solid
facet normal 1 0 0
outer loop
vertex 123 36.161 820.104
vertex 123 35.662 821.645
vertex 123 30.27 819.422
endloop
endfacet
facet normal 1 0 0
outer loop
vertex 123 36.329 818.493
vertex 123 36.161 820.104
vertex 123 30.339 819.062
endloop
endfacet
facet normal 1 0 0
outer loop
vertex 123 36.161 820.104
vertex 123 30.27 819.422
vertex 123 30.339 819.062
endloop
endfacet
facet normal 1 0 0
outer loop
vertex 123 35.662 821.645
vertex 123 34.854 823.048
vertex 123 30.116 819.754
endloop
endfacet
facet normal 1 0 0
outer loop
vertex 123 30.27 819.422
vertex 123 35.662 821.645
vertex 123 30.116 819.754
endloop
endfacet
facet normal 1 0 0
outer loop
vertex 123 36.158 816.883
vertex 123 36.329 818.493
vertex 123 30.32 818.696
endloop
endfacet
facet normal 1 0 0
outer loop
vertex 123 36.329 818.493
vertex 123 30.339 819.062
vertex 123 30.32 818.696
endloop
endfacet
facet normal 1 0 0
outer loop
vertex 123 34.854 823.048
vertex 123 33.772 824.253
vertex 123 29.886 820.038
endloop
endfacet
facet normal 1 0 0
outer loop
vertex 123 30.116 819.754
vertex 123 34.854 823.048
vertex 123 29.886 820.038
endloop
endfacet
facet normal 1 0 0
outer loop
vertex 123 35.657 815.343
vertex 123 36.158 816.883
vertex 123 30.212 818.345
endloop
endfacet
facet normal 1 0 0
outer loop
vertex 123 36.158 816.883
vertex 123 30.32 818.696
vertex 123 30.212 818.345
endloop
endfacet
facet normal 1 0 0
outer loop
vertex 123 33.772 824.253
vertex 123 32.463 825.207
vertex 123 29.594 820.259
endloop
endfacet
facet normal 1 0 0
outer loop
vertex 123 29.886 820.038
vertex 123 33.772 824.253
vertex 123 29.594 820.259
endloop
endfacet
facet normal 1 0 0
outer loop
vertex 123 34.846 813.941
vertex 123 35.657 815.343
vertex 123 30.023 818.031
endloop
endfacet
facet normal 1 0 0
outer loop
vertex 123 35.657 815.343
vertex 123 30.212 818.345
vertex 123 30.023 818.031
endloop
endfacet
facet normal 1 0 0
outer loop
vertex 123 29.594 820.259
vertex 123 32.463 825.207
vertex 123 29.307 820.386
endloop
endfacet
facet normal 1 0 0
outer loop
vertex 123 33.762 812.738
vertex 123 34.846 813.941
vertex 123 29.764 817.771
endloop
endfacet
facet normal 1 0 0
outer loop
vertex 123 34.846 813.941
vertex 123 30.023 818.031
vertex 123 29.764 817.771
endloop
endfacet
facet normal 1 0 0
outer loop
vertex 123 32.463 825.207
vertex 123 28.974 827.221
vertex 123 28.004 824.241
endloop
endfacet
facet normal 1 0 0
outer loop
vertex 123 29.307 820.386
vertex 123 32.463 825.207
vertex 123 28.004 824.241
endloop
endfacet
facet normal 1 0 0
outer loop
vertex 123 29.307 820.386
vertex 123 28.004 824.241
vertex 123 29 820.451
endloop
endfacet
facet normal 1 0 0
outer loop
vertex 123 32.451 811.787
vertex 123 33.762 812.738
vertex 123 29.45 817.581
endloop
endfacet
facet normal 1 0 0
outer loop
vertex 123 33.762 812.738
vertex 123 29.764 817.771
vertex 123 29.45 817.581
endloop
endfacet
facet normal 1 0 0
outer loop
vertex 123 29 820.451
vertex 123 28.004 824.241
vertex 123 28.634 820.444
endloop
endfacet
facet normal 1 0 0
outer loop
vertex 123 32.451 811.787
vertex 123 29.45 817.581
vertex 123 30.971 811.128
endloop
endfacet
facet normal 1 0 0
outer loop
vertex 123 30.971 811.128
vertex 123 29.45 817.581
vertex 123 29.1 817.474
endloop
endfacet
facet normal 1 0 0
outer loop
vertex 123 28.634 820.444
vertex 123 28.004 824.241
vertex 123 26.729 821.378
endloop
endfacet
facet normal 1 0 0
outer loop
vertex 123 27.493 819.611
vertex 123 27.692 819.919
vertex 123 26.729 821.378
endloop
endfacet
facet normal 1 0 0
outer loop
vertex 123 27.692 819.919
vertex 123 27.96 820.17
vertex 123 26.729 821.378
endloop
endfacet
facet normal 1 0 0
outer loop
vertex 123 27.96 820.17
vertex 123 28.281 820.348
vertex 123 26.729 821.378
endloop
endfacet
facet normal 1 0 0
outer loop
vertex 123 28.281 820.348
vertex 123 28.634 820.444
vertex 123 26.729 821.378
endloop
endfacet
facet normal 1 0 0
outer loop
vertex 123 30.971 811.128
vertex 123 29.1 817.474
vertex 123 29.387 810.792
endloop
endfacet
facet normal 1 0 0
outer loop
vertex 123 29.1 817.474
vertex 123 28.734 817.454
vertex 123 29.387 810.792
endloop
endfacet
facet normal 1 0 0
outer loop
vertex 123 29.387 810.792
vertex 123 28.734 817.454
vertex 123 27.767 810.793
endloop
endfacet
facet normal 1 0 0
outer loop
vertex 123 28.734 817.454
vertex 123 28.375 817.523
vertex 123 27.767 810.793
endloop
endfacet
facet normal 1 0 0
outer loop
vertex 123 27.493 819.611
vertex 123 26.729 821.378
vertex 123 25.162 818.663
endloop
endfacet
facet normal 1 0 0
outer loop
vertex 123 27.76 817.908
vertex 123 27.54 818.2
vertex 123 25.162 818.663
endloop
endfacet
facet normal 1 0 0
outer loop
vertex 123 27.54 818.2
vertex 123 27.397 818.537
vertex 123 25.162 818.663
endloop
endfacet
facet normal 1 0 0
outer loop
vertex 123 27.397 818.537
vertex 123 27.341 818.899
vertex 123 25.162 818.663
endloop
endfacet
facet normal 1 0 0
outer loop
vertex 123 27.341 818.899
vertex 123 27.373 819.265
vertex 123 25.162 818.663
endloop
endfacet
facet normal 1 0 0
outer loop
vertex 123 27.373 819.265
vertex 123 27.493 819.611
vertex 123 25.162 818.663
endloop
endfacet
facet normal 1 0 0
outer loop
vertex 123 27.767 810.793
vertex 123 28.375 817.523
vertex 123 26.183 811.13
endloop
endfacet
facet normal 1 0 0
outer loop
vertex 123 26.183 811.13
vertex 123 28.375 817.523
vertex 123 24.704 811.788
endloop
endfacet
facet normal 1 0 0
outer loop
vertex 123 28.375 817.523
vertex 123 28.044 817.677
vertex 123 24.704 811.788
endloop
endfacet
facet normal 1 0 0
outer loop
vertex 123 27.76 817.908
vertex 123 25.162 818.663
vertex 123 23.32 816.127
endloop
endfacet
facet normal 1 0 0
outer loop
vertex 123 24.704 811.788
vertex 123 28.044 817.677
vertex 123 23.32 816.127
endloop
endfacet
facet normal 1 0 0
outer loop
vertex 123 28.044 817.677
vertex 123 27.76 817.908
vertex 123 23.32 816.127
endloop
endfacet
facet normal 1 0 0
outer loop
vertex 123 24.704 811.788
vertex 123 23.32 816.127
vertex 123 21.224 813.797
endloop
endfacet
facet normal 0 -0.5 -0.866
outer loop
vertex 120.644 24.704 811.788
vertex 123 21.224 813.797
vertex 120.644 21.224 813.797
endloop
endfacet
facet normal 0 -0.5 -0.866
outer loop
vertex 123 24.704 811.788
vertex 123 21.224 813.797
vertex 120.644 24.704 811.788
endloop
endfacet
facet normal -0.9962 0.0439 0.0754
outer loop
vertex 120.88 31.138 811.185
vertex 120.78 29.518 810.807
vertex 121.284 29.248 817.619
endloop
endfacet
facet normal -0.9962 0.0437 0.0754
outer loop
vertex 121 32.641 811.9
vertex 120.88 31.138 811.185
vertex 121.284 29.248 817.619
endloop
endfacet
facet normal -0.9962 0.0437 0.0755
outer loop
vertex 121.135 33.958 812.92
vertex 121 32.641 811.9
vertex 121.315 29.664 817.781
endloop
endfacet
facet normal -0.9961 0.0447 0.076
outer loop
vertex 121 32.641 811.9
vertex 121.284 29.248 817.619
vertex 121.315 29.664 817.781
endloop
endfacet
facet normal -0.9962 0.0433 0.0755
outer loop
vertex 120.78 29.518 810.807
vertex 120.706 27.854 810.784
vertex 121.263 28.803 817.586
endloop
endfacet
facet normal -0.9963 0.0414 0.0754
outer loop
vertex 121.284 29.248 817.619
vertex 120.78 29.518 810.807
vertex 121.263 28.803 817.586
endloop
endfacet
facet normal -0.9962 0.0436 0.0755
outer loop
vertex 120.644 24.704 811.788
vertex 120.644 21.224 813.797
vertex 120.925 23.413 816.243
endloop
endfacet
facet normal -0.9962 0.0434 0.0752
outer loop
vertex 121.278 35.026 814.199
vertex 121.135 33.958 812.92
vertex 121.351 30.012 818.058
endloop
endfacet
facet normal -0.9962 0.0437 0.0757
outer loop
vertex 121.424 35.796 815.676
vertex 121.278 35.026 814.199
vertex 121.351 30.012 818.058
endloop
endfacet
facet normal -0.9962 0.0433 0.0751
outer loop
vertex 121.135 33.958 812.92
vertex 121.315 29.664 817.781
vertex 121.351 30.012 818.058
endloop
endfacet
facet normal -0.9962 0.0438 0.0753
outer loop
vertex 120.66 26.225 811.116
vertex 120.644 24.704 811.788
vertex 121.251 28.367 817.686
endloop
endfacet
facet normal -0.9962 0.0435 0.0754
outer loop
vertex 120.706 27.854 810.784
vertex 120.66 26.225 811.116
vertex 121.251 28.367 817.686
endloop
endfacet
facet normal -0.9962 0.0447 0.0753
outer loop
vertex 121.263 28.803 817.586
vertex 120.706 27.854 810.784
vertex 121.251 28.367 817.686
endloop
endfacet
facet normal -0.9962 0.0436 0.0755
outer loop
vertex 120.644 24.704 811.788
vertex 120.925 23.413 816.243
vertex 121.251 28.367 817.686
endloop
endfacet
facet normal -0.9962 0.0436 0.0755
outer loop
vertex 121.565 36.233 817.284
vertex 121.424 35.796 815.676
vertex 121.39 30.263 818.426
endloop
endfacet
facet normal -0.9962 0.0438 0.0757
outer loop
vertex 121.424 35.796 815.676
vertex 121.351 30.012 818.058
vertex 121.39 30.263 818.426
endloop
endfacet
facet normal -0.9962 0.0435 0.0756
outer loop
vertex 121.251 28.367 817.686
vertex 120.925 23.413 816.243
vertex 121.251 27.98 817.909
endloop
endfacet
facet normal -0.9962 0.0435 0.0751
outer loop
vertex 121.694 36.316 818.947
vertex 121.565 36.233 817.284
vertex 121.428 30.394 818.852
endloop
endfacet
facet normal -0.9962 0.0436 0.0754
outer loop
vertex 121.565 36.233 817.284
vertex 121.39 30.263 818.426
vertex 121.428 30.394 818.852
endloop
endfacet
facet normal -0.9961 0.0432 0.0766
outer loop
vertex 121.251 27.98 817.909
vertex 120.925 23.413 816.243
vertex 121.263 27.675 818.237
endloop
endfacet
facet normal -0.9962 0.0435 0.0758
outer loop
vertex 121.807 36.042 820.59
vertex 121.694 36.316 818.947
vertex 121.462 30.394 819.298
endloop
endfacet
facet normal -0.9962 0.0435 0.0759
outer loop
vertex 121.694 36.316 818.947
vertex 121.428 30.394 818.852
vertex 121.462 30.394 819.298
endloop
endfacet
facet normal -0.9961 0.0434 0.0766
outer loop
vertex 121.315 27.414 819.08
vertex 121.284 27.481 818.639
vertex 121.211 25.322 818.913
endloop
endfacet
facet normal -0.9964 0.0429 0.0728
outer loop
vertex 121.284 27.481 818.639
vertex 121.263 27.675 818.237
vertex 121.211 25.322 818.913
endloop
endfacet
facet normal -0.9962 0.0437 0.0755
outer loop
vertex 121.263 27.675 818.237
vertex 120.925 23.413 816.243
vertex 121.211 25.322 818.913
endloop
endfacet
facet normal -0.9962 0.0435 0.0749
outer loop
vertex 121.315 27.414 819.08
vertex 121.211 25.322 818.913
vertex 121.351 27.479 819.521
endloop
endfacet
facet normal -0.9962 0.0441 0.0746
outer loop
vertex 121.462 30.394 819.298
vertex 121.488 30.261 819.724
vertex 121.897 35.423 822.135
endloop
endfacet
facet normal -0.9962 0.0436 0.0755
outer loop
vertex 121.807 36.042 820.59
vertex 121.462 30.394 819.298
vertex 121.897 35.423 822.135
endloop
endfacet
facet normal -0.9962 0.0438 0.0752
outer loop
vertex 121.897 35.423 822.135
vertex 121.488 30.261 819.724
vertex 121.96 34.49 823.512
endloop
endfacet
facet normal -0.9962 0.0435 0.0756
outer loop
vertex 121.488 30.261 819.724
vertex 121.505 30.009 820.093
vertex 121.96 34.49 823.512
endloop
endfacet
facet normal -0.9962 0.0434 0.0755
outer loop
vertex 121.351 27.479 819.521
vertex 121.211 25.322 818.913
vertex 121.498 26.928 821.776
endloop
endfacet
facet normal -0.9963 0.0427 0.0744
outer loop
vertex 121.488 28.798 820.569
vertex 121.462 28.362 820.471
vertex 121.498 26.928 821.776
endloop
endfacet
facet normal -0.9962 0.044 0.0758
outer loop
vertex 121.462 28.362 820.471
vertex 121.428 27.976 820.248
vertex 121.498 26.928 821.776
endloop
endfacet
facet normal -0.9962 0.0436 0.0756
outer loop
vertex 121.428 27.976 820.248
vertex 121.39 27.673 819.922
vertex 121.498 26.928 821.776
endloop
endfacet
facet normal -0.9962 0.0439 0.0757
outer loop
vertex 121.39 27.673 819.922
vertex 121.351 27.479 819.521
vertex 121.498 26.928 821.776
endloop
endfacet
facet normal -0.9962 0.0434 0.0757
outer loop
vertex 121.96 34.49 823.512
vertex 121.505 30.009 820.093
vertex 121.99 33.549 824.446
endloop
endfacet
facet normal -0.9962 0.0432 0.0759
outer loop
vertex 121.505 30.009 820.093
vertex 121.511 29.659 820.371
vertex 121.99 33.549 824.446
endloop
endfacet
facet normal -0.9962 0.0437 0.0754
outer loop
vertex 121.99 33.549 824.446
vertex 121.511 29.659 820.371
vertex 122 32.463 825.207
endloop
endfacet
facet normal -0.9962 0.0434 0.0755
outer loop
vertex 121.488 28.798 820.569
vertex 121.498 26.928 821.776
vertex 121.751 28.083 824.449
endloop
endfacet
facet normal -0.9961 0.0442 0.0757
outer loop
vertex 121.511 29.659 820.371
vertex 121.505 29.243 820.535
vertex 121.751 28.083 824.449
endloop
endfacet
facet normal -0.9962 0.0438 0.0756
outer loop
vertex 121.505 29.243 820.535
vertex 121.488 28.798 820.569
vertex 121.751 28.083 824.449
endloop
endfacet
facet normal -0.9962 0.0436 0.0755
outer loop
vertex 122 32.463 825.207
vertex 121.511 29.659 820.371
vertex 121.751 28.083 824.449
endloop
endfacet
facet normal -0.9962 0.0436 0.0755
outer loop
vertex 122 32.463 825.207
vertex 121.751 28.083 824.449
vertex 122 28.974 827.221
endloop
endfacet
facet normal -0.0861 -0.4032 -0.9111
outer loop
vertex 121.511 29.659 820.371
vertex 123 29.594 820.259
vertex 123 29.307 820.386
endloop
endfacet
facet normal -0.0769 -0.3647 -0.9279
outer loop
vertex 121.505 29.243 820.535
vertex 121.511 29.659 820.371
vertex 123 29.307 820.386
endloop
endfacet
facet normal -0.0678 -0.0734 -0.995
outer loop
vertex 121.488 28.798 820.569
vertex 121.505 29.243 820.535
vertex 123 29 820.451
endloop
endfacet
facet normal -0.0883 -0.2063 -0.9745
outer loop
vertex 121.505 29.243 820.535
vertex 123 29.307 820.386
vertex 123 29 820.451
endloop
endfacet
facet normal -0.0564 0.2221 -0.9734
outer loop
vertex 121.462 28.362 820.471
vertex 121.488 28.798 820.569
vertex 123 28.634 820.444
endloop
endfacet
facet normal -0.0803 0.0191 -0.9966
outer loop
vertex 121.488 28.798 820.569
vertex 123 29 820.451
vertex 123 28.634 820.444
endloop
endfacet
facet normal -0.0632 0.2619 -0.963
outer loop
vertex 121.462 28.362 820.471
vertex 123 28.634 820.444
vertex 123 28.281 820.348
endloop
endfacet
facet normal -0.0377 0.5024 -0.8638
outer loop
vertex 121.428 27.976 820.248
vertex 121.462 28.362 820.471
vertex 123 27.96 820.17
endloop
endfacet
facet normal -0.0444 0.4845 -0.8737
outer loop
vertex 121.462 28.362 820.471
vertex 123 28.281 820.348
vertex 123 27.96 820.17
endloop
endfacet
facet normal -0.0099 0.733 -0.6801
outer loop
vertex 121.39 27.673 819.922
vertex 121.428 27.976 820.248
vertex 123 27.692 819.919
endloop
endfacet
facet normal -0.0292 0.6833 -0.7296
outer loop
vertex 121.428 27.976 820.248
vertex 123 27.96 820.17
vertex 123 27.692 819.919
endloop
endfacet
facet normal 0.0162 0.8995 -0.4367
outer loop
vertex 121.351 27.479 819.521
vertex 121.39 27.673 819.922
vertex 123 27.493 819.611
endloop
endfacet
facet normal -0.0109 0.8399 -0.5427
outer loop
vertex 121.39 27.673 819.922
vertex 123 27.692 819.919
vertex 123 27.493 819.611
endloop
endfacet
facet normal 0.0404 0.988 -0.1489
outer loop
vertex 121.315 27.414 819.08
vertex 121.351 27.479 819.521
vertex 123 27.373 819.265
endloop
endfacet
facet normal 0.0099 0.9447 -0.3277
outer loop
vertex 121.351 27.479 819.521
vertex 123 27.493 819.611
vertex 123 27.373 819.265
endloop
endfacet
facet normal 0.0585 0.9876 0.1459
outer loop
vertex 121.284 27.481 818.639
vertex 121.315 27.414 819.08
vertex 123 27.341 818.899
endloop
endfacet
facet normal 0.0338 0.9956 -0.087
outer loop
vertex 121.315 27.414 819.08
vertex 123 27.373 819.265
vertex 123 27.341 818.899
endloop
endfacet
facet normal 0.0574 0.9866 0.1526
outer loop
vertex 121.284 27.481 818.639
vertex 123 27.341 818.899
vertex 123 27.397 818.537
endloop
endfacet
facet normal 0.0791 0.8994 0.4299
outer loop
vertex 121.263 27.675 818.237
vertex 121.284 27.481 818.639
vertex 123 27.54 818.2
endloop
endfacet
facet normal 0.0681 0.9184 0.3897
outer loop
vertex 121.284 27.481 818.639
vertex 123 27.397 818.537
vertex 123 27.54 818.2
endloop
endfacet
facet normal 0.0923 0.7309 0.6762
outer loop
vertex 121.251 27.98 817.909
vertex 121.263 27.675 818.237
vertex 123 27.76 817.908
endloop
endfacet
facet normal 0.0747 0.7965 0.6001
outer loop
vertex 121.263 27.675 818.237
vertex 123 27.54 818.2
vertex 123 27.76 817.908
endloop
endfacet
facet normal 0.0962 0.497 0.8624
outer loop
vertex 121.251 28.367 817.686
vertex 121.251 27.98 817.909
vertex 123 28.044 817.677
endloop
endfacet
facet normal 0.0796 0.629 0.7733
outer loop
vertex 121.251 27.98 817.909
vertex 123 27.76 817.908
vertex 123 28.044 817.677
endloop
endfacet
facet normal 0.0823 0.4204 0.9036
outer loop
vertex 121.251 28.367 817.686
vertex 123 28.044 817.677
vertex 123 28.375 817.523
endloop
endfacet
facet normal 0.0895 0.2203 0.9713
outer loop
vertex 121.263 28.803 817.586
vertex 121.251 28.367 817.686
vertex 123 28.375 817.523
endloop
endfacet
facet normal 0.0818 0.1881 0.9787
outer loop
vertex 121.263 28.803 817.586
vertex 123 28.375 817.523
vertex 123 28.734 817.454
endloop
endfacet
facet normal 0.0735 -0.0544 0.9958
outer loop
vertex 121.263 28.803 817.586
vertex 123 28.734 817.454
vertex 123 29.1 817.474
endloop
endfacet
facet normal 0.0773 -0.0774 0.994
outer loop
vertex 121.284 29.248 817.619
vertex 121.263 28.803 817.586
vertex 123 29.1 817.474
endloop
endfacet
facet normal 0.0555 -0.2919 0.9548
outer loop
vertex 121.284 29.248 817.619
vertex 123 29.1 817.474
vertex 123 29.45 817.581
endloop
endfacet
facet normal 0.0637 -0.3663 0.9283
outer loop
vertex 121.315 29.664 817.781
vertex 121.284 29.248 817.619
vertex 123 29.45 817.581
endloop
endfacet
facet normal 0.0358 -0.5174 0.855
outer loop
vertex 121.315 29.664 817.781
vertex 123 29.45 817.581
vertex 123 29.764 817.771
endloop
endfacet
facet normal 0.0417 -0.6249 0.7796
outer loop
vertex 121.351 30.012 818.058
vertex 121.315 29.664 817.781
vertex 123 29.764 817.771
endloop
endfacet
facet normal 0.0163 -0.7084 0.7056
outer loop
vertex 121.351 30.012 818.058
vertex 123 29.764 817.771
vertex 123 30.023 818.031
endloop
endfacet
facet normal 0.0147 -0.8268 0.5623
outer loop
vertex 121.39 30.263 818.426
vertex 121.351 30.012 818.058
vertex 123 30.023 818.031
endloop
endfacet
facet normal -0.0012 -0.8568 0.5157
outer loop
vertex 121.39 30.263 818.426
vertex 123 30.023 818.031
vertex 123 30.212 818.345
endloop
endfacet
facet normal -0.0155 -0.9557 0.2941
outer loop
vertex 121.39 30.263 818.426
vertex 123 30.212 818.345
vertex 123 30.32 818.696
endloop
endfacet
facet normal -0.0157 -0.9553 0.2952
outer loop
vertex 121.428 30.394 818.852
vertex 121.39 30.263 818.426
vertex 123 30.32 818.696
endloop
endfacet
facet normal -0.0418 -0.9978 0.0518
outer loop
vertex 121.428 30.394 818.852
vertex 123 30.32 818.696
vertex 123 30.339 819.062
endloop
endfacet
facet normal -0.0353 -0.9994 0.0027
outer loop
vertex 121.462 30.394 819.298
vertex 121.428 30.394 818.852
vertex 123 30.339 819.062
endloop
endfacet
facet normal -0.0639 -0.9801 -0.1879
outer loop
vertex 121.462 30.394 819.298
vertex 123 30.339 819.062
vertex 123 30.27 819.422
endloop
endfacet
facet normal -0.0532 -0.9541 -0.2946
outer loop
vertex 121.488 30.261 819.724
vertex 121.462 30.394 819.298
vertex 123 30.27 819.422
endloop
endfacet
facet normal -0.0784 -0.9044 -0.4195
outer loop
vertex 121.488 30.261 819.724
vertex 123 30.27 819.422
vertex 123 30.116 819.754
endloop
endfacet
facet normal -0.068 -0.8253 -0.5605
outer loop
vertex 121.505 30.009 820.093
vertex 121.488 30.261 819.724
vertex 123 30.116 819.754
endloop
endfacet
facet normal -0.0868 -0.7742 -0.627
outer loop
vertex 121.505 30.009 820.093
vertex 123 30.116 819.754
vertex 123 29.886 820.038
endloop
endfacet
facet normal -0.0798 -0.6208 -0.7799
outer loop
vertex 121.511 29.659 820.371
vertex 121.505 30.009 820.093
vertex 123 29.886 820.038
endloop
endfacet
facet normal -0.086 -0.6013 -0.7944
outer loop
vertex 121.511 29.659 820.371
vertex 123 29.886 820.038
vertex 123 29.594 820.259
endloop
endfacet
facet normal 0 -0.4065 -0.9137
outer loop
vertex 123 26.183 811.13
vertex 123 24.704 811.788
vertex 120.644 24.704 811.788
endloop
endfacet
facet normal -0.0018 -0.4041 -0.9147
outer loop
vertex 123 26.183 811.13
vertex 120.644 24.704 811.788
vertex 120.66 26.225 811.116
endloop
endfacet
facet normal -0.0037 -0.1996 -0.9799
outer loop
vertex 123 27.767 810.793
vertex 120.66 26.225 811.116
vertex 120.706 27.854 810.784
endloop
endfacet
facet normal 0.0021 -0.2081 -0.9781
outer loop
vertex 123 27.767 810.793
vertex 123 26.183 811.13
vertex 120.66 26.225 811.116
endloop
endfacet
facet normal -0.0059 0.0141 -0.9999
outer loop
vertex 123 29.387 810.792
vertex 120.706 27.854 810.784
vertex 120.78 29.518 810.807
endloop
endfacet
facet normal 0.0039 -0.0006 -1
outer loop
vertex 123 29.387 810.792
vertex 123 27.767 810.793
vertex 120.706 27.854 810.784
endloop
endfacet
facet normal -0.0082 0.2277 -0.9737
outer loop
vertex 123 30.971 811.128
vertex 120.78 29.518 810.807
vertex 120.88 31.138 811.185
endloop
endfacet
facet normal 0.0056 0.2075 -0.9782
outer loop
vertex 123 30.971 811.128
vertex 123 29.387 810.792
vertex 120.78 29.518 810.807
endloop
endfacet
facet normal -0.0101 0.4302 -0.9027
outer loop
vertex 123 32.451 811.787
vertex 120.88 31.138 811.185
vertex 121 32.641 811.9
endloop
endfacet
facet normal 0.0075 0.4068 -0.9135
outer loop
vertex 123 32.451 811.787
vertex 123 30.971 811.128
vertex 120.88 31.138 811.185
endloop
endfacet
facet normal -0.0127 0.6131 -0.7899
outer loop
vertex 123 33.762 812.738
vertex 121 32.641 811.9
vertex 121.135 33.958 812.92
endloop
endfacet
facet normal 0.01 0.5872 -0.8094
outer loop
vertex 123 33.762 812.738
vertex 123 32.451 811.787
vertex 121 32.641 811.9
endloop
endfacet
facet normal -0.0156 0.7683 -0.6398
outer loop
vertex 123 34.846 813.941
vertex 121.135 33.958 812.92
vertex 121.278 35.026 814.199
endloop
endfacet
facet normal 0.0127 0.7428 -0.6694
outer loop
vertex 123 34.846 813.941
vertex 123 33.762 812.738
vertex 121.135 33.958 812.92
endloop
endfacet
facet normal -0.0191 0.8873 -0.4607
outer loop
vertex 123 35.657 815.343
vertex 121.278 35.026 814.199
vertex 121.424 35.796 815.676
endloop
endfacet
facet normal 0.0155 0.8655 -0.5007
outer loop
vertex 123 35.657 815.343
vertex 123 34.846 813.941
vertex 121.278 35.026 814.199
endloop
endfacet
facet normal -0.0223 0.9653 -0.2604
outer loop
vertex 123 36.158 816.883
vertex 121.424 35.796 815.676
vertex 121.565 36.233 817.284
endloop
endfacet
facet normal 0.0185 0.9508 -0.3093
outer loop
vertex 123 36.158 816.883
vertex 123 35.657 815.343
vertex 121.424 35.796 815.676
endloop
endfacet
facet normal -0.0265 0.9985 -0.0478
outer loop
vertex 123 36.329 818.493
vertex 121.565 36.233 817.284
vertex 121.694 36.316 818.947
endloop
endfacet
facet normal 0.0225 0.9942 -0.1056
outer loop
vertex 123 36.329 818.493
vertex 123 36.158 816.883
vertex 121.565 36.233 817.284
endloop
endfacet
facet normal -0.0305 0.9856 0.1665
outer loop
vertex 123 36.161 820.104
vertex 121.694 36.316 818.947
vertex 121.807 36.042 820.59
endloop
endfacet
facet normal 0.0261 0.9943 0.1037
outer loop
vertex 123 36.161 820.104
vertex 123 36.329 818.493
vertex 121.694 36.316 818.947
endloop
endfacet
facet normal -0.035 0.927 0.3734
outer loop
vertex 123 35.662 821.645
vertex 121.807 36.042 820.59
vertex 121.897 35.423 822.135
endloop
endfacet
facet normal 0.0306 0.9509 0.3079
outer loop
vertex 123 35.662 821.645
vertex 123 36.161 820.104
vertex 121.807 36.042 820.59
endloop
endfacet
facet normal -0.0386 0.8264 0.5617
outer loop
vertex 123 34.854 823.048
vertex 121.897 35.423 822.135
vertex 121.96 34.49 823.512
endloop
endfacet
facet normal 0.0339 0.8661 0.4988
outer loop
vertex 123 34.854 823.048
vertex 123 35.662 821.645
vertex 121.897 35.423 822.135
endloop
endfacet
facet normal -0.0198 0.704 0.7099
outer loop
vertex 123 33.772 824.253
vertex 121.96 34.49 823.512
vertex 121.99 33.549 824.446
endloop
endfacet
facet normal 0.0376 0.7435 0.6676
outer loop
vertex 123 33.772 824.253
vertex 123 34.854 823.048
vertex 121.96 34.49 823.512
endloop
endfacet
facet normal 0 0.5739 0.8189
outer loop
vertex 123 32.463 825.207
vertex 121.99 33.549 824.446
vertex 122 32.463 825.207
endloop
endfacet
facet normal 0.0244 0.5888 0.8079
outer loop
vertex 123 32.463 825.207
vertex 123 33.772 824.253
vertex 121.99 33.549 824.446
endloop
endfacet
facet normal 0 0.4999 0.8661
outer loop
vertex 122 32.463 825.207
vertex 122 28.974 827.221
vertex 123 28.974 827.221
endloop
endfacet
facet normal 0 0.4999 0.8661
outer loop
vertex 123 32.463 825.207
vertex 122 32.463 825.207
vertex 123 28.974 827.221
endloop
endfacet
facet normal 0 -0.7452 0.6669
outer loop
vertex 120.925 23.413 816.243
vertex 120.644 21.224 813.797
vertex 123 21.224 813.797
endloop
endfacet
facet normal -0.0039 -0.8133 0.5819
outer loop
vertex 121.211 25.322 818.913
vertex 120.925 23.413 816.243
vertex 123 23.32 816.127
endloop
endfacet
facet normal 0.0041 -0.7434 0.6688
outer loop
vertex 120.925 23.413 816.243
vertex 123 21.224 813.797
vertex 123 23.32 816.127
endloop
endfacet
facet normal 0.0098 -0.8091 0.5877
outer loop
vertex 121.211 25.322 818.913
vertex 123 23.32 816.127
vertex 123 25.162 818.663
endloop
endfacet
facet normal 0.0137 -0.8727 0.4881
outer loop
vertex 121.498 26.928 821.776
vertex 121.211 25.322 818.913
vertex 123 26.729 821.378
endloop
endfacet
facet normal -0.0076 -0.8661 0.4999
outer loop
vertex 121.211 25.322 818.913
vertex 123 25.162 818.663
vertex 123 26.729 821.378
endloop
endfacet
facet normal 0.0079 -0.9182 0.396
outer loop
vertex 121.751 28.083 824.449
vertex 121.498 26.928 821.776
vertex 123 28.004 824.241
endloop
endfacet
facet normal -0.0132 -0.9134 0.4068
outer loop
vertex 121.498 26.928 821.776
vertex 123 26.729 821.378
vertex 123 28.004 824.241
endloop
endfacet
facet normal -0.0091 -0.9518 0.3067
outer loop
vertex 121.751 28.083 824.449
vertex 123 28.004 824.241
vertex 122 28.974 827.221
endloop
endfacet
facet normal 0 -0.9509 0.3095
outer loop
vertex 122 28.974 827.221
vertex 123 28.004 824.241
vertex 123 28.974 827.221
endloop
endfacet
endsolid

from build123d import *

# Parameters (mm, degrees)
PAD040_DEPTH         = 42
SKETCH121_W          = 51.449978
SKETCH121_H          = 41.216857
POCKET061_DEPTH      = 2.357074
POCKET061_DEPTH_BACK = 0.001
SKETCH122_R          = 1.5
POCKET062_DEPTH      = 9.321248
POCKET062_DEPTH_BACK = 0.001


with BuildPart() as part:
    # Sketch120 (on DatumPlane) → Pad040 (new body)
    with BuildSketch(Plane(origin=(6, 0, 0), x_dir=(1, 0, 0), z_dir=(0, -0.866025, 0.5))):
        Polygon((-6, 7.75), (-6, -7.75), (-8.356074, -7.75), (-7, 7.75), align=None)
    extrude(amount=-PAD040_DEPTH)

    # Sketch121 → Pocket061 (cut, two sides)
    with BuildSketch(Plane.YZ) as pocket061_sk:
        with Locations((16.010519, -12.541656)):
            Rectangle(SKETCH121_W, SKETCH121_H)
        with BuildLine():
            ThreePointArc((21.223867, -21.202535), (25.980762, -15), (28.973867, -7.779141))
            Line((28.973867, -7.779141), (32.453838, -9.788303))
            ThreePointArc((24.703838, -23.211697), (35.290535, -20.375), (32.453838, -9.788303))
            Line((21.223867, -21.202535), (24.703838, -23.211697))
        make_face(mode=Mode.SUBTRACT)
    extrude(amount=-POCKET061_DEPTH, mode=Mode.SUBTRACT)
    extrude(pocket061_sk.sketch, amount=POCKET061_DEPTH_BACK, mode=Mode.SUBTRACT)

    # Sketch122 (on DatumPlane) → Pocket062 (cut, two sides)
    with BuildSketch(Plane(origin=(6, 0, 0), x_dir=(0.087156, 0.498097, 0.86273), z_dir=(0.996195, -0.043578, -0.075479))) as pocket062_sk:
        with Locations((0, -33)):
            Circle(SKETCH122_R)
    extrude(amount=-POCKET062_DEPTH, mode=Mode.SUBTRACT)
    extrude(pocket062_sk.sketch, amount=POCKET062_DEPTH_BACK, mode=Mode.SUBTRACT)


with BuildPart() as part_1:
    # Body022023 placement: moved
    add(part.part.moved(Location((123, 0, 835))))


solid = part_1.part
